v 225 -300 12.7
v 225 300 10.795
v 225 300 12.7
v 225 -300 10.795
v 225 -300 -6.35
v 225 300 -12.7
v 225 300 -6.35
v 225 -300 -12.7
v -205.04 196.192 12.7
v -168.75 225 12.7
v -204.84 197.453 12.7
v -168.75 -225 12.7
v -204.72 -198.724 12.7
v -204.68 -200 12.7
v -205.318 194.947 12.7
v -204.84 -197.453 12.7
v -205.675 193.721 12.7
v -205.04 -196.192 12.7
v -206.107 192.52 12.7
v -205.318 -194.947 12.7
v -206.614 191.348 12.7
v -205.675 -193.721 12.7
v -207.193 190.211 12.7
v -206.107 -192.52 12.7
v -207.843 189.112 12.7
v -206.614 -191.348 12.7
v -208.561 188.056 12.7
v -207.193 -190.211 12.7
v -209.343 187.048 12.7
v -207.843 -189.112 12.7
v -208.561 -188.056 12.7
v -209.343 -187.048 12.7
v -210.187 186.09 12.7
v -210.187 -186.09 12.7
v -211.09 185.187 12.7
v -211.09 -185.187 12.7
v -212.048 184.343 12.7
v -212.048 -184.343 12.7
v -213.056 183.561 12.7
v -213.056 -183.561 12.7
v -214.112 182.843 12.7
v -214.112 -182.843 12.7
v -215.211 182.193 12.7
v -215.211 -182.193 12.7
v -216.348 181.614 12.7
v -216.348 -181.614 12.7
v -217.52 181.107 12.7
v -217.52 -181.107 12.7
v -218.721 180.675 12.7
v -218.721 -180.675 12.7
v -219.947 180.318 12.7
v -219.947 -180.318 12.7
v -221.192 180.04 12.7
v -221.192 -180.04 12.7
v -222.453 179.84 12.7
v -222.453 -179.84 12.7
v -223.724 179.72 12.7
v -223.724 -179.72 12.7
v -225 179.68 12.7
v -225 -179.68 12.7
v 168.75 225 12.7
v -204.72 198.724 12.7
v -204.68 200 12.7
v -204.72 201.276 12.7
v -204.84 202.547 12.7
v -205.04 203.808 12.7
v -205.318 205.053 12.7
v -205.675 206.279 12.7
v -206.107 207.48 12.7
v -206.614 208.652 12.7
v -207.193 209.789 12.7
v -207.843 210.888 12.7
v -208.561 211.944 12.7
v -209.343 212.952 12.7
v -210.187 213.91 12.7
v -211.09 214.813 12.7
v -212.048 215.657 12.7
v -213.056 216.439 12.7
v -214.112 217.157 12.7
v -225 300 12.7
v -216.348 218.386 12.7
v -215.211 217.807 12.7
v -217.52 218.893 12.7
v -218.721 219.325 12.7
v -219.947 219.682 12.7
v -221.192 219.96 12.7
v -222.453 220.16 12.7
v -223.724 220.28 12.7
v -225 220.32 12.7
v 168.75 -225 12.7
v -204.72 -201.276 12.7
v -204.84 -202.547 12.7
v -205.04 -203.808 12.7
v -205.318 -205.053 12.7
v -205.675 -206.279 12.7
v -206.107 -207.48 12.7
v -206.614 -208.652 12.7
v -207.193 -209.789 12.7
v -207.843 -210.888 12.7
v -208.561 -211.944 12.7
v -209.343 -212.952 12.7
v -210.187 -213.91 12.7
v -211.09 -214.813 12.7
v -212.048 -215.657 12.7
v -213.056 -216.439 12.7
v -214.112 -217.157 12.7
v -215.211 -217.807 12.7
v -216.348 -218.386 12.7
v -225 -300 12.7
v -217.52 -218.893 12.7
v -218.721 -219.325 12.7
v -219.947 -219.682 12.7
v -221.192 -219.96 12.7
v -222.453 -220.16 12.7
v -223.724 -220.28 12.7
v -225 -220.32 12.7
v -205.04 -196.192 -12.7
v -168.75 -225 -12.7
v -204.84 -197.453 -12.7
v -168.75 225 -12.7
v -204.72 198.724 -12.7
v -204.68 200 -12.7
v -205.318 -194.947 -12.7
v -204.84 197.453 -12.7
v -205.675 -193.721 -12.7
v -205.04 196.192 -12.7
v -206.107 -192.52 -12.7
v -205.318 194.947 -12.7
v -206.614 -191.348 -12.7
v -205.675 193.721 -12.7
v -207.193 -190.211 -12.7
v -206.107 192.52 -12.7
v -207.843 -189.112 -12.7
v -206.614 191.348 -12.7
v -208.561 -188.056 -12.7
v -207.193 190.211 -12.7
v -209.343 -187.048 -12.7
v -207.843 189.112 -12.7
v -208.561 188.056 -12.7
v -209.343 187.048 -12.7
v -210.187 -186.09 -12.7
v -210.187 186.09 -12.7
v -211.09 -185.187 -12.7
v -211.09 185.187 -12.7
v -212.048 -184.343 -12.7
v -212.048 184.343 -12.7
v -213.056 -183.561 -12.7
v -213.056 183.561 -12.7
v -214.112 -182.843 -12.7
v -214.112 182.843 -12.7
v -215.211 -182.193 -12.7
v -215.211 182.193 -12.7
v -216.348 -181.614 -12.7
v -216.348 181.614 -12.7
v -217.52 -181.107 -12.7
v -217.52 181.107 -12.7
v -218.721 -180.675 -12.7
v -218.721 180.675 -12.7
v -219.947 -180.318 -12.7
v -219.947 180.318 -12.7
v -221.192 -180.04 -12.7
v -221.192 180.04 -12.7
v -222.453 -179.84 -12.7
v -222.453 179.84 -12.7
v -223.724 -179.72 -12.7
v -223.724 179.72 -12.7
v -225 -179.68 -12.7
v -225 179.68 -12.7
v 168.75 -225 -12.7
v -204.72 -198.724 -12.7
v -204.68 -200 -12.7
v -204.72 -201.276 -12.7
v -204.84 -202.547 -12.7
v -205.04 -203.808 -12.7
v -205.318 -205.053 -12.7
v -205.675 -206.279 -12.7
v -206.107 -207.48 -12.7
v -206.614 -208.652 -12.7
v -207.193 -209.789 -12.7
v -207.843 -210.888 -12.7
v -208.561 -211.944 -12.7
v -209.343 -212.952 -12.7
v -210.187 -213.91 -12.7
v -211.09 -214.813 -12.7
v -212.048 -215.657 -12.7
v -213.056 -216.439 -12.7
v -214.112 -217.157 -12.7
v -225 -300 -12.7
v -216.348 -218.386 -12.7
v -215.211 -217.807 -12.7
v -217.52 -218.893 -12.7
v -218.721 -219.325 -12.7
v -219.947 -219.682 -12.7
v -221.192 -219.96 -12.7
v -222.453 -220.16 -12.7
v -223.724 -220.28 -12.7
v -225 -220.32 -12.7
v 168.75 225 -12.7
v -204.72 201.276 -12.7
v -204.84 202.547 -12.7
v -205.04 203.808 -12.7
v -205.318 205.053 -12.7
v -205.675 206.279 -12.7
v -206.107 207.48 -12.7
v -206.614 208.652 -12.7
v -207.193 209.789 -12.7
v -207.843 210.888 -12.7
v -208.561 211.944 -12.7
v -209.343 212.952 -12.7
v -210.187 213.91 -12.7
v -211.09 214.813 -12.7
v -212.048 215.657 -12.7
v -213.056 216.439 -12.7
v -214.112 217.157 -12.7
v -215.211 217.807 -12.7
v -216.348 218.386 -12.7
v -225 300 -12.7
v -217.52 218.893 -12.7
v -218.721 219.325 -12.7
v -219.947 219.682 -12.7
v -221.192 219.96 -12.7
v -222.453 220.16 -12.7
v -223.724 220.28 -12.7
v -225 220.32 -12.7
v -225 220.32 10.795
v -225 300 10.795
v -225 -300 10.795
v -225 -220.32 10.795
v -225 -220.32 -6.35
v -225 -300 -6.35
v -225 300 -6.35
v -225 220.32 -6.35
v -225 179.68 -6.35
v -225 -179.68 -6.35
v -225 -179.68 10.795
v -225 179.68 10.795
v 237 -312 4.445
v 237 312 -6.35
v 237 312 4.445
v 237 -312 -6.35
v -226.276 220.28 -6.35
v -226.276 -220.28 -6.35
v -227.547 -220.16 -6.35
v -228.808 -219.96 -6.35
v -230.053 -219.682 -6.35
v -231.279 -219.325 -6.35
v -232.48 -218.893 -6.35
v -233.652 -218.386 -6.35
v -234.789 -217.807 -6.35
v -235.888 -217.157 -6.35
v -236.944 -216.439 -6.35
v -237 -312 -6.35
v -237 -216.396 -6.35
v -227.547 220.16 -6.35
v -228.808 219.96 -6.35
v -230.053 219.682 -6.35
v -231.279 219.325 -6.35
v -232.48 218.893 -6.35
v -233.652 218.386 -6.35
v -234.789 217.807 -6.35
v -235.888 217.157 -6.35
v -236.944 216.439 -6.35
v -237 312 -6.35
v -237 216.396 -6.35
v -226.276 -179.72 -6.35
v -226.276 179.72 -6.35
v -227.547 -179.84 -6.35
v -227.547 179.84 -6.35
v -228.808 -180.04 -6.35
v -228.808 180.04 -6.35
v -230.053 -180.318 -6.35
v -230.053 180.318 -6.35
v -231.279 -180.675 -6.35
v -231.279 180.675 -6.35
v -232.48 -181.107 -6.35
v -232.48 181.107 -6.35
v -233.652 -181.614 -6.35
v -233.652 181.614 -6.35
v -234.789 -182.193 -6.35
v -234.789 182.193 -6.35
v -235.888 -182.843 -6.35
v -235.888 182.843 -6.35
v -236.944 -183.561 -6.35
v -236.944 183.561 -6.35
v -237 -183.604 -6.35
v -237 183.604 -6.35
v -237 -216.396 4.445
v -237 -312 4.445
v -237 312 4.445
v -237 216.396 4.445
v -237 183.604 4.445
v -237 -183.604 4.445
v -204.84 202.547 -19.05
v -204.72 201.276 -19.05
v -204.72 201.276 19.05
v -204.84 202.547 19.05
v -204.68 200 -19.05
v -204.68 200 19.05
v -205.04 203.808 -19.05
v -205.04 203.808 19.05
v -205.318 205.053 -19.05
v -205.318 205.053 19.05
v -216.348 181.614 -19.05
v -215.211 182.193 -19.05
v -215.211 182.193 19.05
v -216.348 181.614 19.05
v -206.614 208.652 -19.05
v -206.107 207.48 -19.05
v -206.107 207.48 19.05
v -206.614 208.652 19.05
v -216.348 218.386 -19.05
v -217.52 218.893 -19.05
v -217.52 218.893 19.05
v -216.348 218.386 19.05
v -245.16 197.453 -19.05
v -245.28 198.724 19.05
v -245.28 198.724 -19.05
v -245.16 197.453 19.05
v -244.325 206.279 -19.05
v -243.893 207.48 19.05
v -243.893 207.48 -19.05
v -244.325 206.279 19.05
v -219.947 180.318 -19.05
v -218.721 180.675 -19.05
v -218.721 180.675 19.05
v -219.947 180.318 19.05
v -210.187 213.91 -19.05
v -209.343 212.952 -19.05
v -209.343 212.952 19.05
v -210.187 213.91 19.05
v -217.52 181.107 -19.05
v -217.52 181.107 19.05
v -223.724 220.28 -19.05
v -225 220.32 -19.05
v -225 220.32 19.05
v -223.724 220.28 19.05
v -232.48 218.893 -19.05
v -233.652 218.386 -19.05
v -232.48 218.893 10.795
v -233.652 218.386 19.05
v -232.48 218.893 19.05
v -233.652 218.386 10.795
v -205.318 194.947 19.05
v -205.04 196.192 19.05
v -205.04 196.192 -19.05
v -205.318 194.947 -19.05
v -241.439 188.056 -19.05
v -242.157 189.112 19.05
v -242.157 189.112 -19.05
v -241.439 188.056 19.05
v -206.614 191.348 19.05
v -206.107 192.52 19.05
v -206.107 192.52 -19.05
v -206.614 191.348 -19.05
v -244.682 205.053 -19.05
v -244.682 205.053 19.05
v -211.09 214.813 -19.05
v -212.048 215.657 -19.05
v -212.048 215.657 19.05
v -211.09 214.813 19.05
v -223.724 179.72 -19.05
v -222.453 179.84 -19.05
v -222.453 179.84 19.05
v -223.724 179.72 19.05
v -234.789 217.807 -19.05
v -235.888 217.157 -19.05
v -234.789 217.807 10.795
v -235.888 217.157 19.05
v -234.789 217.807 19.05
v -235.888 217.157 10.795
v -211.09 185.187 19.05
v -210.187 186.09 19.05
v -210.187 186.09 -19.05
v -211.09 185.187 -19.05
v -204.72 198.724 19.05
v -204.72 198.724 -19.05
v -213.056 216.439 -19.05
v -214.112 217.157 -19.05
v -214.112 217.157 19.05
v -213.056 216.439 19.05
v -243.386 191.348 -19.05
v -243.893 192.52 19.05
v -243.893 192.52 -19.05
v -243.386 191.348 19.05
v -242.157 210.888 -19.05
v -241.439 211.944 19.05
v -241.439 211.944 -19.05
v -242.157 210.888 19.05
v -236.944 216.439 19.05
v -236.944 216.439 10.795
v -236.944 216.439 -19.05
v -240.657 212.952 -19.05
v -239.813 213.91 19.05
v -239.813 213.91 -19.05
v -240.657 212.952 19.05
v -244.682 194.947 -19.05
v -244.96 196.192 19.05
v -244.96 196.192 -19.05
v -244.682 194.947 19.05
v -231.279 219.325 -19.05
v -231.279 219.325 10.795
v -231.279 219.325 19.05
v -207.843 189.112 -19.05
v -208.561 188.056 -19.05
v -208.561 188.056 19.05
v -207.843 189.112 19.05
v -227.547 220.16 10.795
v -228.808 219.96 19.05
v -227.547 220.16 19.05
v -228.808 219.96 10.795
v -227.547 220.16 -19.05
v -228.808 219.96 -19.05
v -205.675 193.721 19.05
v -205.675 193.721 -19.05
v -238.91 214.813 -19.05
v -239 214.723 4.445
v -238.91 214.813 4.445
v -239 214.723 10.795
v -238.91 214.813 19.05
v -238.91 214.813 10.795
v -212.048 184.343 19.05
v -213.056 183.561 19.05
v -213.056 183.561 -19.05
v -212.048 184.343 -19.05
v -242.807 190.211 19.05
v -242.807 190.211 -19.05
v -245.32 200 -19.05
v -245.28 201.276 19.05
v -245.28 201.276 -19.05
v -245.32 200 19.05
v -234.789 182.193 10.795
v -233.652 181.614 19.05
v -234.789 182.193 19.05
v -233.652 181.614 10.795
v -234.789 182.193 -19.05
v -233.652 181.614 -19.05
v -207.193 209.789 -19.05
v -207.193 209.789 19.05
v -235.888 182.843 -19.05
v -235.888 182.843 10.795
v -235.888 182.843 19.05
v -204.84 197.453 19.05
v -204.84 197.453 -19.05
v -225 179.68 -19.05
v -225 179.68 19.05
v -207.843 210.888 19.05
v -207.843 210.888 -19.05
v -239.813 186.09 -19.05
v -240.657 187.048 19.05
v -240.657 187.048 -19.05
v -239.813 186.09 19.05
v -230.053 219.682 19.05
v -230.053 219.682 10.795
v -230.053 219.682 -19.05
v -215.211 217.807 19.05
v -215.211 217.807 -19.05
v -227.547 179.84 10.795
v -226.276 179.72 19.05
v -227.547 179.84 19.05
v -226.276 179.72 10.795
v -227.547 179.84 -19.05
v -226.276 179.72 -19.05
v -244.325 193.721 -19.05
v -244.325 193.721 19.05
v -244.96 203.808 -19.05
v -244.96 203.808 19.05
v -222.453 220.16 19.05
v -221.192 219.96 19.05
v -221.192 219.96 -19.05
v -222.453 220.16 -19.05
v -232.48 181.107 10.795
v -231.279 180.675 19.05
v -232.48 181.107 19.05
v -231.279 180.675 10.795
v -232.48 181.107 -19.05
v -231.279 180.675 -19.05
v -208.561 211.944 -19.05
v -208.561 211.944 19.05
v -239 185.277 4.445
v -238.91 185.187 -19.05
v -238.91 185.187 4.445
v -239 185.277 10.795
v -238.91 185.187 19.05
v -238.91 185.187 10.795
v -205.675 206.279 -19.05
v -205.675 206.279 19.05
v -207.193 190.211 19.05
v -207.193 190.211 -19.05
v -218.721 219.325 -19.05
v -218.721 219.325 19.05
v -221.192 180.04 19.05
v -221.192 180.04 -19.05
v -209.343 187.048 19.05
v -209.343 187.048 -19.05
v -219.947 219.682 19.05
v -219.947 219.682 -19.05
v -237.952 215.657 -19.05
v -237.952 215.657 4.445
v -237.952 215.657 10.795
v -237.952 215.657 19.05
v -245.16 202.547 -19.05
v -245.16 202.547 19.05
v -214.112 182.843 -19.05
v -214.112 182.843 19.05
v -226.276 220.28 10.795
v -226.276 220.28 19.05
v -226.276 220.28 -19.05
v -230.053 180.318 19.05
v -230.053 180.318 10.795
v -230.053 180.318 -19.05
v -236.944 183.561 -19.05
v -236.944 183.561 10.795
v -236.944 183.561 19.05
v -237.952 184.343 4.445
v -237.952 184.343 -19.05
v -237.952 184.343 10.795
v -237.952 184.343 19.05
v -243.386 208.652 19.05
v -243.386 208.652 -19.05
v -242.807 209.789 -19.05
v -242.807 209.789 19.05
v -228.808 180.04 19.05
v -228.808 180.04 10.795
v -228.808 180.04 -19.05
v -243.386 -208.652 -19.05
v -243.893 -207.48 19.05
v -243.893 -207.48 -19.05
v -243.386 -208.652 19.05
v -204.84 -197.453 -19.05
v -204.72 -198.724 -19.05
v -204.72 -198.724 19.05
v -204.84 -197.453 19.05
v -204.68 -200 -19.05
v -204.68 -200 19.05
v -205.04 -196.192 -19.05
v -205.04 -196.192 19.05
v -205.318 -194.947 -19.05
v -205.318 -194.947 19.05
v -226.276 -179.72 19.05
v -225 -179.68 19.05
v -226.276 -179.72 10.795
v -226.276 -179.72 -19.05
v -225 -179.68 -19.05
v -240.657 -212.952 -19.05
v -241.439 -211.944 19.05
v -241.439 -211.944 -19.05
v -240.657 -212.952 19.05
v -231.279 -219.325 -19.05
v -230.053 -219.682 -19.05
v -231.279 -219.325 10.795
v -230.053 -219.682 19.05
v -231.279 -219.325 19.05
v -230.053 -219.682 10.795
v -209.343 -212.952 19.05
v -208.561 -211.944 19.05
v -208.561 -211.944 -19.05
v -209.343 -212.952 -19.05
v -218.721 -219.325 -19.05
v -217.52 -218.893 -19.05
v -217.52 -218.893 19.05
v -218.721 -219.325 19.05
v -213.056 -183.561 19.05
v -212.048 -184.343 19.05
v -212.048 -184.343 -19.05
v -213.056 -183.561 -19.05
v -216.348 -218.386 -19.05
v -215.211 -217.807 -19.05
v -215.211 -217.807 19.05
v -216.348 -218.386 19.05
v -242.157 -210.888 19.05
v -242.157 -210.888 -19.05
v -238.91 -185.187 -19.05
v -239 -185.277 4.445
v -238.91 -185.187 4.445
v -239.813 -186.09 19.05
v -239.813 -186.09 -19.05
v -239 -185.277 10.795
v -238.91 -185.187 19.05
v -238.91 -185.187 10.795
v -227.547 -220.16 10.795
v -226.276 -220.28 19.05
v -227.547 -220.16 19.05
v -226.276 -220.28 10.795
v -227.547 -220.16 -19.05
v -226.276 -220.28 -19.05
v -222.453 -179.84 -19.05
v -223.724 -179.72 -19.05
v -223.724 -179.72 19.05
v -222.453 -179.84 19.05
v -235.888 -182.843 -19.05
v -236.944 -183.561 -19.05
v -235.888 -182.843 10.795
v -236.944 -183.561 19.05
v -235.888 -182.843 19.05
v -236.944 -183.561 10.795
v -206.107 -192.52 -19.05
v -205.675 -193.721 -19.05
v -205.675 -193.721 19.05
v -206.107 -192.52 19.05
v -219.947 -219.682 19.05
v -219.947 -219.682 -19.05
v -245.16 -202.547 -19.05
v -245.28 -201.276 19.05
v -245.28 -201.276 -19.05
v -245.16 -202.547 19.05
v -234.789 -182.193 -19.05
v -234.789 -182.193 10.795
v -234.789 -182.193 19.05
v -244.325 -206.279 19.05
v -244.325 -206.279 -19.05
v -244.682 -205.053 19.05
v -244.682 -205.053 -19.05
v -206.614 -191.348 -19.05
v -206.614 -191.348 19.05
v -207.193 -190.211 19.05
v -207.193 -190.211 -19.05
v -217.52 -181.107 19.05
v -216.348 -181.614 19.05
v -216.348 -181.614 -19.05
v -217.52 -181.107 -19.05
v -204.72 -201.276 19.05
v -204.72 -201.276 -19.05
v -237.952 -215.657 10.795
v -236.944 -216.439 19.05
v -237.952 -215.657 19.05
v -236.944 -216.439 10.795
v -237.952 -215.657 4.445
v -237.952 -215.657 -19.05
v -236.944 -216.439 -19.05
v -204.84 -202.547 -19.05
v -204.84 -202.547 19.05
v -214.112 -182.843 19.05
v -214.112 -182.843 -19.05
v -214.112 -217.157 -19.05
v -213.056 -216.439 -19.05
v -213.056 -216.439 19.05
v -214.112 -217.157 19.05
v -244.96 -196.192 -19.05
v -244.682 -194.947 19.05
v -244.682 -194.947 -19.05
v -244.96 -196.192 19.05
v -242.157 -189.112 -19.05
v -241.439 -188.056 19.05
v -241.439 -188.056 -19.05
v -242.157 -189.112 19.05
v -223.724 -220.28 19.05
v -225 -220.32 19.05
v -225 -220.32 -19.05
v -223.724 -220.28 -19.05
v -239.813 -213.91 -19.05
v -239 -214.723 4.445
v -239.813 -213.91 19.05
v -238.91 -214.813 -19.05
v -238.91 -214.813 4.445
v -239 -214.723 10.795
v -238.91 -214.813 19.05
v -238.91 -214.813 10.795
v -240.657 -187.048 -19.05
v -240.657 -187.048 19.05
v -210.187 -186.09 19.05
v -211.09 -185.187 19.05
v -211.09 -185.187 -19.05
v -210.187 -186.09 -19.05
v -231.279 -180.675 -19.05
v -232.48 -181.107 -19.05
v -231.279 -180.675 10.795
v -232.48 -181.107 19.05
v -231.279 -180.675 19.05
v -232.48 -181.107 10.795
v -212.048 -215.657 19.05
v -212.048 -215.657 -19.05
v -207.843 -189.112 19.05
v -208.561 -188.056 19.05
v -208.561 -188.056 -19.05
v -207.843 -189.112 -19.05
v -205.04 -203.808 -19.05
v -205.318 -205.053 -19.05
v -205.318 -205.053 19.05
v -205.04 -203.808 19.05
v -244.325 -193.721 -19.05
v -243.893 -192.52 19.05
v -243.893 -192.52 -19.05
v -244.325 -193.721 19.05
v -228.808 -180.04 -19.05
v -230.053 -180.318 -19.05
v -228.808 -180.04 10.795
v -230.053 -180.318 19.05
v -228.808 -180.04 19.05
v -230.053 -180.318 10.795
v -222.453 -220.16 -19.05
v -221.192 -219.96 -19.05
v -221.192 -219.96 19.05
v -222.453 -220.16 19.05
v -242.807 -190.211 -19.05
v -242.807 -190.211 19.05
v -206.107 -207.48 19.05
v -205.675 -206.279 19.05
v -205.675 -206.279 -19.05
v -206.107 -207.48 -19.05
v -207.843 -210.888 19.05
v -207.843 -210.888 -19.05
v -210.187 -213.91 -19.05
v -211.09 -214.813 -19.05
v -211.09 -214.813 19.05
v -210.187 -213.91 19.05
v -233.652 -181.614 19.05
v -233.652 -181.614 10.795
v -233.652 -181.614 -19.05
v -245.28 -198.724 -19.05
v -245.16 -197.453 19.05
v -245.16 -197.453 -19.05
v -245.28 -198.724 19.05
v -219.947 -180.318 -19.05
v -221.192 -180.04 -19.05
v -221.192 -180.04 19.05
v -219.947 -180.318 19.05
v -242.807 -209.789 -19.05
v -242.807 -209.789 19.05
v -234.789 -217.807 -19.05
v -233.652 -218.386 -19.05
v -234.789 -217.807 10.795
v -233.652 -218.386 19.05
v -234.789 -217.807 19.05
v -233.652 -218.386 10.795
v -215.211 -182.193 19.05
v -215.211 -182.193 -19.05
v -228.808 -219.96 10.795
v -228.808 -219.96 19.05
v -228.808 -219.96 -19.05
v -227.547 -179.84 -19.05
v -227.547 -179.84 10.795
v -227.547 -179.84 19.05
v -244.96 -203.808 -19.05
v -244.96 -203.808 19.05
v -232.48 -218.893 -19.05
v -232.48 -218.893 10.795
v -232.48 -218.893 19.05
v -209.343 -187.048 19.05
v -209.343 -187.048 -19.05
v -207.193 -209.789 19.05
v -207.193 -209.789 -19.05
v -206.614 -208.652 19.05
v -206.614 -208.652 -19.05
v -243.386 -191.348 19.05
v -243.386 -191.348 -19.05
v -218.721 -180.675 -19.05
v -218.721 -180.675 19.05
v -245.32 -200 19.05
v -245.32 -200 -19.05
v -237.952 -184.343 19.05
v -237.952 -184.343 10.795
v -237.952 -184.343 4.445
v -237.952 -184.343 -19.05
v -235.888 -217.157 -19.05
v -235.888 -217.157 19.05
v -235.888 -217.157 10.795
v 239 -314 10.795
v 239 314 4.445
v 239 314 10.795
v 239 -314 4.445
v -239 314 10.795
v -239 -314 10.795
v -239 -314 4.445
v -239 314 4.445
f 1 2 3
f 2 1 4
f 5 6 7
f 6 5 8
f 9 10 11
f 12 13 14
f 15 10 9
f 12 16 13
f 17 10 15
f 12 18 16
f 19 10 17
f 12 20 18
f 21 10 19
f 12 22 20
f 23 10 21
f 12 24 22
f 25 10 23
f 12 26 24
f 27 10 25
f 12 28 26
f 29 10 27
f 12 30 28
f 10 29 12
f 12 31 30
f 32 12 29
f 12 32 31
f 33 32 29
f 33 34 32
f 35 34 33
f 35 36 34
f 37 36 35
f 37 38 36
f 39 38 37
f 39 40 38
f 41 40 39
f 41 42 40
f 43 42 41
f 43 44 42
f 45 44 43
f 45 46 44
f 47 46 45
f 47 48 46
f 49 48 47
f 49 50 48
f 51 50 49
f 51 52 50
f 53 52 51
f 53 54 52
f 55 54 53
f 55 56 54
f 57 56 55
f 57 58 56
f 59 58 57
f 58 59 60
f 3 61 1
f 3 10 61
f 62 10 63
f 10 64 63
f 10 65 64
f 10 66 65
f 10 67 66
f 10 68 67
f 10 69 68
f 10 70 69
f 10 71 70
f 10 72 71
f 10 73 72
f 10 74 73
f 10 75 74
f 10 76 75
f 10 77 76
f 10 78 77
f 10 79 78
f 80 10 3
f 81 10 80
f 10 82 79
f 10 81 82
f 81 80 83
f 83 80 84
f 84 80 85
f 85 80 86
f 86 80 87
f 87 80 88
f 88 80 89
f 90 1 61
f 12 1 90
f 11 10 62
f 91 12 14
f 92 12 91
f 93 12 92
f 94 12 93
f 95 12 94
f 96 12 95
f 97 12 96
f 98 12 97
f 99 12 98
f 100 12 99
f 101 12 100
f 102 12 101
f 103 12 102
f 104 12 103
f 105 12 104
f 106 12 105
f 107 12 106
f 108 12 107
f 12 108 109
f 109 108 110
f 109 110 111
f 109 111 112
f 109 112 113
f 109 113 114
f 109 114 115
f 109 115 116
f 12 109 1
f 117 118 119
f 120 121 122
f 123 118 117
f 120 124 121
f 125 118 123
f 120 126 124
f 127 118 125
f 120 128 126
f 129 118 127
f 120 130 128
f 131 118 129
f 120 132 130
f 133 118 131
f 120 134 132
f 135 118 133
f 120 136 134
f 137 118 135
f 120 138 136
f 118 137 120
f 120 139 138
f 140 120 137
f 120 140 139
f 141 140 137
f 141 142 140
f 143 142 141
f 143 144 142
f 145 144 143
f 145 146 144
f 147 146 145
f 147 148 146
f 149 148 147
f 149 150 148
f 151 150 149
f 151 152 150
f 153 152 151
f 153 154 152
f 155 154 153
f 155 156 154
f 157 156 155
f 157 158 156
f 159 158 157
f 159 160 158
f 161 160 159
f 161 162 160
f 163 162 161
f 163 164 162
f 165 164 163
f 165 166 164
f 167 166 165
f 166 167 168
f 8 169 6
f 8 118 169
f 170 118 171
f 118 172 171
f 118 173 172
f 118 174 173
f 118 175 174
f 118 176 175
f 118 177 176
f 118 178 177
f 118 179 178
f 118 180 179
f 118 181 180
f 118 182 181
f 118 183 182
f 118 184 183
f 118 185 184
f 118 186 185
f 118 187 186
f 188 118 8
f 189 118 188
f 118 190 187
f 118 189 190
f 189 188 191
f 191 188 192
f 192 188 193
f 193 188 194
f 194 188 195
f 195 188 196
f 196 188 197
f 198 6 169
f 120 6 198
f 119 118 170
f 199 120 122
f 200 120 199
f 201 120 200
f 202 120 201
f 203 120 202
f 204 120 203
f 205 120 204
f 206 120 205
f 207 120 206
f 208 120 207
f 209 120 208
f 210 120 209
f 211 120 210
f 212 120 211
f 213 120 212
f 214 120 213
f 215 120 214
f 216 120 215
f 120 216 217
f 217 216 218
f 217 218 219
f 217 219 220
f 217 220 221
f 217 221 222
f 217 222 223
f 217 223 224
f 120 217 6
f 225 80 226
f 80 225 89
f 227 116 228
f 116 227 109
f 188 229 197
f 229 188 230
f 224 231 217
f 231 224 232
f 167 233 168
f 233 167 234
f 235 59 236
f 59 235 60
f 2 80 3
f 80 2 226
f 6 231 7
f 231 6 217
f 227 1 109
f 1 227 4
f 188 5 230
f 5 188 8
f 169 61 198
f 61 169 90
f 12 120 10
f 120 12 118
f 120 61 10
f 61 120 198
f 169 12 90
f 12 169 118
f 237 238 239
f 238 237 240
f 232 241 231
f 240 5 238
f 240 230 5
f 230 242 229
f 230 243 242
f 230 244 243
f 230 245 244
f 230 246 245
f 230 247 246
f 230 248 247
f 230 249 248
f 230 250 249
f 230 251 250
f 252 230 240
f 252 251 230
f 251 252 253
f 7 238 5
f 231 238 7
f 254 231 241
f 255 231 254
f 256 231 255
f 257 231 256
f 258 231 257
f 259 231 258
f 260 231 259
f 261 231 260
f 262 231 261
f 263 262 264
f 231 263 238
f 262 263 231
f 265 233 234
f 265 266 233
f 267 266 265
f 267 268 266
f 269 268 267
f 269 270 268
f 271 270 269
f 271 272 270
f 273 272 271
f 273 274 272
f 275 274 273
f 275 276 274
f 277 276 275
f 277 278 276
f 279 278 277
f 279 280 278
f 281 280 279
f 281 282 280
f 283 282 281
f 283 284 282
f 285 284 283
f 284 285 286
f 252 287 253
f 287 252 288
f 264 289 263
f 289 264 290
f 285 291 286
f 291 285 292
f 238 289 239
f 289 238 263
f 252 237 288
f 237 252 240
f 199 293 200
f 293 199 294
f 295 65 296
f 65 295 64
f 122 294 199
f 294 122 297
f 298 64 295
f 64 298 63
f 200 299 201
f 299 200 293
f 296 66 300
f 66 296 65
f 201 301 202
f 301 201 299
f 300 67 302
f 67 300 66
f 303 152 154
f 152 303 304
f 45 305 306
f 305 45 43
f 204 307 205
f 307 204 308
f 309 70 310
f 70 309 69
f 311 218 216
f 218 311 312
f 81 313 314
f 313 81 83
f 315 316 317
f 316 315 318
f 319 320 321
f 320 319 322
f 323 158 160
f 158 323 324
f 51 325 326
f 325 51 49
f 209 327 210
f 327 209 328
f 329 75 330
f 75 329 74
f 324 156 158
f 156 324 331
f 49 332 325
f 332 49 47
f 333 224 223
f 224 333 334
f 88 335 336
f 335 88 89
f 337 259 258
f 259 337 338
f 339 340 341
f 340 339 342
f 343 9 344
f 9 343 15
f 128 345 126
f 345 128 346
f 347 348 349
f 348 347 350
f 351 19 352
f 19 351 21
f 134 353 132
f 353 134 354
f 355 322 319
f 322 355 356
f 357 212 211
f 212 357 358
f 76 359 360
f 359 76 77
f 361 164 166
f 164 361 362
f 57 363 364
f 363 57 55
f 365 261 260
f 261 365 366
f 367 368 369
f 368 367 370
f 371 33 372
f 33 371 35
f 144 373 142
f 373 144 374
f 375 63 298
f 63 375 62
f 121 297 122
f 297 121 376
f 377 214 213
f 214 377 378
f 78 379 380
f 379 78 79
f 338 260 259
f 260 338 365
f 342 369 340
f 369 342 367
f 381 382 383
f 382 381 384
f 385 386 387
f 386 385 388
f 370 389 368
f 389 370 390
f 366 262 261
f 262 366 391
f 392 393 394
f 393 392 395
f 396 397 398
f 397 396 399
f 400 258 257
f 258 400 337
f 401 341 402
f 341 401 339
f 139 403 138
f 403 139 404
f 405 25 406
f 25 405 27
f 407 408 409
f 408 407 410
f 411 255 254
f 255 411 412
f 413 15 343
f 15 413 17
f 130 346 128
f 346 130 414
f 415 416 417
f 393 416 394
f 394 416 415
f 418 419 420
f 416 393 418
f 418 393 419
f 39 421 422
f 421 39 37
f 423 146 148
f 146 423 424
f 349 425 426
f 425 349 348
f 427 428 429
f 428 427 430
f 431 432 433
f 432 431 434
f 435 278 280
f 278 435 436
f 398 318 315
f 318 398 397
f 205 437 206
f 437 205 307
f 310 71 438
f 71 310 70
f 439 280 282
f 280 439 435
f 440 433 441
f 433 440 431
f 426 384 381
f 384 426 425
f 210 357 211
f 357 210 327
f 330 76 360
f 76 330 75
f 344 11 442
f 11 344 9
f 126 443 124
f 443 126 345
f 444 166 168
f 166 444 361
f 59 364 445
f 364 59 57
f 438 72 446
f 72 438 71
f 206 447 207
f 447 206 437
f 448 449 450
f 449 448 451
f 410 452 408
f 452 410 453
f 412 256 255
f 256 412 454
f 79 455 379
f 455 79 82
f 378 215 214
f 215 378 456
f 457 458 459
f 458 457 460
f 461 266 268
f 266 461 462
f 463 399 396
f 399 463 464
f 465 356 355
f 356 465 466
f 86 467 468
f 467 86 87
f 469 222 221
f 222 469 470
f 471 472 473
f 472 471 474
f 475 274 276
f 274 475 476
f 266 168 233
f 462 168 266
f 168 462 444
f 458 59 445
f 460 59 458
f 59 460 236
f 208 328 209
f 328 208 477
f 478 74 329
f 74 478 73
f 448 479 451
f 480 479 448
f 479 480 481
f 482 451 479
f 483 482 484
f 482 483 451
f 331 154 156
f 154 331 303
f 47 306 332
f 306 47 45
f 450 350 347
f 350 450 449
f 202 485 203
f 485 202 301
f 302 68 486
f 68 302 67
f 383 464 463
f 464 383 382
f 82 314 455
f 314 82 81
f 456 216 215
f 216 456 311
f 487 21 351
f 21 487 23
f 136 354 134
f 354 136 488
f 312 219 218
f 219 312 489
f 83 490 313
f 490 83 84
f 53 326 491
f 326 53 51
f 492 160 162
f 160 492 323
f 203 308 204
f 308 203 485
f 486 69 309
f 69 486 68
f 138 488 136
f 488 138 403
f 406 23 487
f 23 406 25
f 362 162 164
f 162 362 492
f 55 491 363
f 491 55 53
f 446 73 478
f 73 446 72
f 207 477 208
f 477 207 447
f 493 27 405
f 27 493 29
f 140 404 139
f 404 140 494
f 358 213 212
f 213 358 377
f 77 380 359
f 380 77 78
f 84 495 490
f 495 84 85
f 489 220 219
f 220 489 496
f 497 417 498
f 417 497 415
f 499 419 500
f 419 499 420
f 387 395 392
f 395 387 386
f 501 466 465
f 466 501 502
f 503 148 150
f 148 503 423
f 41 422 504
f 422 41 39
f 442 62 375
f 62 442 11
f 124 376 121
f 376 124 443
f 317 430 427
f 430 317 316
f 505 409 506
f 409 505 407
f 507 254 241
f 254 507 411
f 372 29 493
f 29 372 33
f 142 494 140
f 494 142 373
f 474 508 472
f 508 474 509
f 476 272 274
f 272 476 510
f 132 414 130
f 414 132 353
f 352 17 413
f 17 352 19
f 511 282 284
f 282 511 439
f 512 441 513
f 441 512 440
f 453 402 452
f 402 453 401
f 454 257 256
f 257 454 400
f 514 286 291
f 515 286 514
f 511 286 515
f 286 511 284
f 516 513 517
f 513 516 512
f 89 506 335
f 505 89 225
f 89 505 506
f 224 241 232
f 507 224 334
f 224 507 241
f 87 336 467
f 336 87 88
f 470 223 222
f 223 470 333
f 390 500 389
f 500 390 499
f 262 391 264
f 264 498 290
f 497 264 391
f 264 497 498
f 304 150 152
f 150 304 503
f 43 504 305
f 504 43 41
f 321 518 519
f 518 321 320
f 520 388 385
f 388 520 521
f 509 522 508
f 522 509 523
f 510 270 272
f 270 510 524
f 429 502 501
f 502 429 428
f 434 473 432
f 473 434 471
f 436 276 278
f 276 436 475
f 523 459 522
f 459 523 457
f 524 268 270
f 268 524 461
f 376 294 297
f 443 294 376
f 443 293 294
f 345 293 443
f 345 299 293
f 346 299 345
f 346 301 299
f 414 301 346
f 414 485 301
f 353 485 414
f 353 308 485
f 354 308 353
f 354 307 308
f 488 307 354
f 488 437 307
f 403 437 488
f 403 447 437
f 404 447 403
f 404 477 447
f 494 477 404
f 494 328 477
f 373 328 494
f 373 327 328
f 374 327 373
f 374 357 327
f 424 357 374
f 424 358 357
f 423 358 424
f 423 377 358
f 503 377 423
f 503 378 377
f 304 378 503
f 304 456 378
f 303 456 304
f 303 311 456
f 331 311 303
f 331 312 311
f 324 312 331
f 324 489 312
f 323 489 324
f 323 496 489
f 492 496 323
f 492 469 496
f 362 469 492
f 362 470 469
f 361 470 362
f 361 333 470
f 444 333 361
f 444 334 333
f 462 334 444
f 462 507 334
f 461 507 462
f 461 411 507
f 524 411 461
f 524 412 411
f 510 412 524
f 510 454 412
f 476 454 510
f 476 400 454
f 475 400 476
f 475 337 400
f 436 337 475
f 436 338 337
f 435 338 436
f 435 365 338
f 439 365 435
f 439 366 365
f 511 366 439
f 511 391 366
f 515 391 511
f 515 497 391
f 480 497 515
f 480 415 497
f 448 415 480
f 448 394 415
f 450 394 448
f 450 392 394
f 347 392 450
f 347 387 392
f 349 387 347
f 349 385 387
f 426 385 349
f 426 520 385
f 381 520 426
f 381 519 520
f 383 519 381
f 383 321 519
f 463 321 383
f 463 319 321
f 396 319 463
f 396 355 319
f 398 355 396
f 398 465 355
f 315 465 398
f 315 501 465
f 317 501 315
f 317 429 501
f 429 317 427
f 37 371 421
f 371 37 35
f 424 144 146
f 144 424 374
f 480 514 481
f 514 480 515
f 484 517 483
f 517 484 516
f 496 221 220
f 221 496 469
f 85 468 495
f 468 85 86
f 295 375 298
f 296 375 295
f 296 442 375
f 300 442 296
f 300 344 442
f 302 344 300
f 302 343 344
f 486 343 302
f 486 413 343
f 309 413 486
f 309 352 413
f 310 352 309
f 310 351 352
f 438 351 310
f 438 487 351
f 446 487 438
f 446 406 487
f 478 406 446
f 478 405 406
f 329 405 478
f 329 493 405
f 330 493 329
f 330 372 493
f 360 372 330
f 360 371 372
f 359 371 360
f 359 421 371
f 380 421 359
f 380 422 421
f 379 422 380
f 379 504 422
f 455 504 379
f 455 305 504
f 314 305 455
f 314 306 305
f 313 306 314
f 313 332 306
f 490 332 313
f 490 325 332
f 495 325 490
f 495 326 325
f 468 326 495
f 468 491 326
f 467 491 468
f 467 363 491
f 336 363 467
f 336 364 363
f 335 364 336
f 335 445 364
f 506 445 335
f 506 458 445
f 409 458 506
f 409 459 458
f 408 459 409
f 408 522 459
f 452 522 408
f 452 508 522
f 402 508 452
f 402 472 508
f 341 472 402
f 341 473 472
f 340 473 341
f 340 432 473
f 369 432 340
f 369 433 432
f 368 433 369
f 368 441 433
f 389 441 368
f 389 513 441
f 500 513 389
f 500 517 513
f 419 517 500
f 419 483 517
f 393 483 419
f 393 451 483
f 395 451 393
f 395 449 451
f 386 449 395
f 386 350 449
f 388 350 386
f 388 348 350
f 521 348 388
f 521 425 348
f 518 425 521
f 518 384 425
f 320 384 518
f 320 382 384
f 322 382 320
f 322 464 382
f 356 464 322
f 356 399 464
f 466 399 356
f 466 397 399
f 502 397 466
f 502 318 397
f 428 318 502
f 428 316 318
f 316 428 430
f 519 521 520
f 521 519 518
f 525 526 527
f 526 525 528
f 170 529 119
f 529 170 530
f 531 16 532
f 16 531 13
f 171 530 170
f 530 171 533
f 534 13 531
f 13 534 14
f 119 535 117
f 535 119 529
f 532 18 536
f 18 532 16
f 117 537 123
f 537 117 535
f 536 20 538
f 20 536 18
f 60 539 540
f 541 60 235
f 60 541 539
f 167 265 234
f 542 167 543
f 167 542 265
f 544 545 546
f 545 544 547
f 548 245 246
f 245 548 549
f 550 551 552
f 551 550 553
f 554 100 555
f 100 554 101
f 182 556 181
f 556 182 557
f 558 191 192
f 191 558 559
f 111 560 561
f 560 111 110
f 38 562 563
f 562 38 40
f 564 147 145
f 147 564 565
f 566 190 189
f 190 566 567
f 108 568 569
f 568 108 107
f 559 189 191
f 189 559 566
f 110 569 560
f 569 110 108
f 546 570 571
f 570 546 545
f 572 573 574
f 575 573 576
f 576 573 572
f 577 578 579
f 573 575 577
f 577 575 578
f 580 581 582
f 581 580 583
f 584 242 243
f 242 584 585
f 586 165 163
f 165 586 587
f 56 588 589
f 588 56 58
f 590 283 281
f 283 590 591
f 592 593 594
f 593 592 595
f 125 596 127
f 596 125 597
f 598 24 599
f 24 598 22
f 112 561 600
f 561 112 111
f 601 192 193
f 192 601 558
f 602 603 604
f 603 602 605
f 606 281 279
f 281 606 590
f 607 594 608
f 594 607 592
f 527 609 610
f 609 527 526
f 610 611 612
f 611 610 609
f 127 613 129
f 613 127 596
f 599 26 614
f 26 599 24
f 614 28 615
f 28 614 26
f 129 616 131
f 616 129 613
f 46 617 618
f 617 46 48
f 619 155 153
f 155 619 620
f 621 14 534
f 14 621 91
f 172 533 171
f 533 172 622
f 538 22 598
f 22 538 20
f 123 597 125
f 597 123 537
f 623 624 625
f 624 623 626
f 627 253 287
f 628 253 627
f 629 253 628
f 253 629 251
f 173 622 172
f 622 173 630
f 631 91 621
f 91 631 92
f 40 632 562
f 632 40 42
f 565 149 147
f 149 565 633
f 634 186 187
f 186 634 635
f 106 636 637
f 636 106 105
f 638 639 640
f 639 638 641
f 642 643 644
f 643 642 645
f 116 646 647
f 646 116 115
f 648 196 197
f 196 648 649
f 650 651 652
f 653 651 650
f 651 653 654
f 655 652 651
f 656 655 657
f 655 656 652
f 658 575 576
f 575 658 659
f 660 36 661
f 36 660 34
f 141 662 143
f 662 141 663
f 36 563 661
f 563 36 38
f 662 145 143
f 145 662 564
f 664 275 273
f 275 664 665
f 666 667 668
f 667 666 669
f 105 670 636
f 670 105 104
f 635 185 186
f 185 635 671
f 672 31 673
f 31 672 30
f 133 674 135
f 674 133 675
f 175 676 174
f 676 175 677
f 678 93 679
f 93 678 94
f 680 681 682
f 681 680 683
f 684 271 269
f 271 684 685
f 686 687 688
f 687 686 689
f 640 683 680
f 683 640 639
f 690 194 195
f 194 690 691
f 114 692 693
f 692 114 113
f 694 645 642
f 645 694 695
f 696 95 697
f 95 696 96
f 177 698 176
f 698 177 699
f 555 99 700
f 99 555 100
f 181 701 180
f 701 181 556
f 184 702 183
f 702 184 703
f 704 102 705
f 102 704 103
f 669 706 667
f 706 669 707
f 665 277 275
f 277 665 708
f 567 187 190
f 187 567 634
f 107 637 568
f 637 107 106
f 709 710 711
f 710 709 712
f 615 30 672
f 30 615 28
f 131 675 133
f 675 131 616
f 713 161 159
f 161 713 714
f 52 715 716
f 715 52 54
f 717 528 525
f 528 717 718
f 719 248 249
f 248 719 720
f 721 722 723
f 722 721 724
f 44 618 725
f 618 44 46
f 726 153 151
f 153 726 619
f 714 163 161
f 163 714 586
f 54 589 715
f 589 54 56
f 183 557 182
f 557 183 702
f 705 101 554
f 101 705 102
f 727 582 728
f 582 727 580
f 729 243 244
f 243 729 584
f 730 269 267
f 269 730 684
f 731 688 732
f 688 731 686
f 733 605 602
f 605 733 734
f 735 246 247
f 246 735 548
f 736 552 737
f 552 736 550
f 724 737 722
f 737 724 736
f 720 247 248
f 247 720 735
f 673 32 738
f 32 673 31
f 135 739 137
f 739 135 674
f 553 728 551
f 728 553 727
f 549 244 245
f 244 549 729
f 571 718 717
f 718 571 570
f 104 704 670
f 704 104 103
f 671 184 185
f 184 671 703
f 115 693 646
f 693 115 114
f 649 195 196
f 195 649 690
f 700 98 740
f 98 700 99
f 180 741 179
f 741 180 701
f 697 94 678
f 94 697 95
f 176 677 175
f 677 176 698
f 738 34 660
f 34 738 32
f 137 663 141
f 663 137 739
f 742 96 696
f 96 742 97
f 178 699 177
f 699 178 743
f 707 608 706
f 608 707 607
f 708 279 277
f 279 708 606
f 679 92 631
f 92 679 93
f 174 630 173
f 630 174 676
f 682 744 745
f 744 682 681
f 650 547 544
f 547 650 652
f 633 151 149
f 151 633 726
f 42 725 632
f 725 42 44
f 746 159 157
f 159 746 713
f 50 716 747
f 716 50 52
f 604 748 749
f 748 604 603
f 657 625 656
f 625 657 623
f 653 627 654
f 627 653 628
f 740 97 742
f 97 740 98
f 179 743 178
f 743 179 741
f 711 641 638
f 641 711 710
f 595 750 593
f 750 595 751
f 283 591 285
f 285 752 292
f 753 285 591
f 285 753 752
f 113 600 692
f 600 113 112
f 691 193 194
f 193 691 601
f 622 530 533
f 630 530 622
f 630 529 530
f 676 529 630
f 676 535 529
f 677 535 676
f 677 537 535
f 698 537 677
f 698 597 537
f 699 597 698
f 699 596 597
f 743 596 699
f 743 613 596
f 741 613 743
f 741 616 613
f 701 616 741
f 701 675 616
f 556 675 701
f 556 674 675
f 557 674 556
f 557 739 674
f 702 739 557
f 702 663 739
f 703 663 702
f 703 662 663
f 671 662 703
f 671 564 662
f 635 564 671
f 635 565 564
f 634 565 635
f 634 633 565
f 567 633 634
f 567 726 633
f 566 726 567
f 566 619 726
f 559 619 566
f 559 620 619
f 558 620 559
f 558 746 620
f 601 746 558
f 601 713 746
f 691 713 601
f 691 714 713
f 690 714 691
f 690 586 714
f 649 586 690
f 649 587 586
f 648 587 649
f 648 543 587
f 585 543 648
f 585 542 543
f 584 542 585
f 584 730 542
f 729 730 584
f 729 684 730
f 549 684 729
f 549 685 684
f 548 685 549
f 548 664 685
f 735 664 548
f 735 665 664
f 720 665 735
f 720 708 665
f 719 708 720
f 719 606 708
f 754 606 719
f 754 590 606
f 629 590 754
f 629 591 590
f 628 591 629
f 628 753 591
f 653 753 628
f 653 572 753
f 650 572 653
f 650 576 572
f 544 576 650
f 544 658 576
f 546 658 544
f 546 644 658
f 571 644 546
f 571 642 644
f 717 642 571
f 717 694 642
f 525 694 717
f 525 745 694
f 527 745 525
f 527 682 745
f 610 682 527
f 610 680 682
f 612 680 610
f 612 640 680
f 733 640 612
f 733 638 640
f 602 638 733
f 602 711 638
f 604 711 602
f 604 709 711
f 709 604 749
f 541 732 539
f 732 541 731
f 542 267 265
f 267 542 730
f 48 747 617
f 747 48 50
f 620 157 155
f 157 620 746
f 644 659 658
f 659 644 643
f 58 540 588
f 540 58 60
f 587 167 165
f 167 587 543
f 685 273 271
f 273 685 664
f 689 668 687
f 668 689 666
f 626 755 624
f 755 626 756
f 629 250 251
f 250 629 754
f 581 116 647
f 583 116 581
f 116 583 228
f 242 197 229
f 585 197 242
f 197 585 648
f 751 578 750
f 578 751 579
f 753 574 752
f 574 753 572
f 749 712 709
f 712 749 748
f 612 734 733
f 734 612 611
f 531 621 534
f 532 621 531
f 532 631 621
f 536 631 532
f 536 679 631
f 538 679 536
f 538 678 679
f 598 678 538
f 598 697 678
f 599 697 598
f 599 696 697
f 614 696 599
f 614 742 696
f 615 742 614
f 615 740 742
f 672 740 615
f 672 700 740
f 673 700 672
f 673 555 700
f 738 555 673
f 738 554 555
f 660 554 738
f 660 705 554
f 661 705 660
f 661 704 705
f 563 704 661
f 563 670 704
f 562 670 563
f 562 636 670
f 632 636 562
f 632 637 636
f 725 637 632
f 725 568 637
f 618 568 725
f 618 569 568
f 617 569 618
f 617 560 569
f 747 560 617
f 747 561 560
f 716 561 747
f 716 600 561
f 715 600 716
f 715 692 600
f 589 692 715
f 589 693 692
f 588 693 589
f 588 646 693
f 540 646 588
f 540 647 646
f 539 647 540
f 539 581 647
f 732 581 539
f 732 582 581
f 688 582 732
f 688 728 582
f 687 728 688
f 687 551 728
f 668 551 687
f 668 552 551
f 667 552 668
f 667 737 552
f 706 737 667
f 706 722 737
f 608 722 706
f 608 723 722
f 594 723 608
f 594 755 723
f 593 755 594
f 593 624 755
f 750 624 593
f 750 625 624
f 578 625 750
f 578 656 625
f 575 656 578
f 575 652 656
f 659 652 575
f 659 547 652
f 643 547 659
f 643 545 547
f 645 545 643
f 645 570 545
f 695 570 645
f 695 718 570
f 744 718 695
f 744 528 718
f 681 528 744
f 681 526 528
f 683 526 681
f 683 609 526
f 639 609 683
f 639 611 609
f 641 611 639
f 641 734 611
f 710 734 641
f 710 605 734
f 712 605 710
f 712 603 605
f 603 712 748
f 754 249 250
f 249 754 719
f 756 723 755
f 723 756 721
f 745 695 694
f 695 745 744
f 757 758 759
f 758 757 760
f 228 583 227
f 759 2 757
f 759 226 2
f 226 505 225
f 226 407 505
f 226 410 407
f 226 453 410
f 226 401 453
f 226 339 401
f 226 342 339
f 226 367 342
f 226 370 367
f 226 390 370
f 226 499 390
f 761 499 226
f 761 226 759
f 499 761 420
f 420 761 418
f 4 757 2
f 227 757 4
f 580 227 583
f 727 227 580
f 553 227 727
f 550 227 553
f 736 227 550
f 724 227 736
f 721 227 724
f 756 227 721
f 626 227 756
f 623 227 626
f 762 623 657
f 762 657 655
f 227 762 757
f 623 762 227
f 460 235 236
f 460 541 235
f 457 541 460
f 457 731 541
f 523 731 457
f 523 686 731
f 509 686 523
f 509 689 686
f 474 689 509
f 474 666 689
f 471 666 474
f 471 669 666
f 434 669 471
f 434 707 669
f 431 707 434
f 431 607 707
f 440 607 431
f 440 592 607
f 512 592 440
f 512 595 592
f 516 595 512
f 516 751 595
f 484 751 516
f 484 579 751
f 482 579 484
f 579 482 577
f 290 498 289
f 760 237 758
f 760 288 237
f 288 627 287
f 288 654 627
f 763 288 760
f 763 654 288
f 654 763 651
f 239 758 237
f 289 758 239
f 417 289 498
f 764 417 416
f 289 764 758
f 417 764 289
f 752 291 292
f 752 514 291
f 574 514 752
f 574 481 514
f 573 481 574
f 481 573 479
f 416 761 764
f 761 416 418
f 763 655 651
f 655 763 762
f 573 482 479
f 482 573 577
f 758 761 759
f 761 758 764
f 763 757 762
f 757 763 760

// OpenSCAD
// File Path: src/hardware/parametric_animal_door.scad
// =========================================================================
// UNIVAC IX INDUSTRIAL ACCESS CORES — PARAMETRIC ANIMAL-SAFE SHIELD GATE
// Features Dynamic Sizing Scaling and Integrated Neoprene Anti-Fur/Tail Guards
// Washdown-Proof Profile Configured for Constant High-Pressure Water Spray
// =========================================================================

$fn = 100; // Enforce crisp geometric resolutions

// --- DYNAMIC SCALE FACTOR PRINT SETTINGS ---
// Set scale_tier = 1 for Pig/Sheep flap doors; scale_tier = 2 for Large Timber Barn Doors
scale_tier = 1; 

// Sizing Matrix translation block based on selected installation tier
door_width  = (scale_tier == 1) ? 450.0  : 1800.0; // mm
door_height = (scale_tier == 1) ? 600.0  : 2400.0; // mm
door_thick  = (scale_tier == 1) ? 25.4   : 76.2;   // mm

// --- Safety & Fur Guard Constraints ---
guard_clearance = (scale_tier == 1) ? 12.0 : 35.0; // Anti-pinch gap buffer
gasket_thickness = 4.0; // Heavy gauge flexible neoprene backing sheet

module parametric_gate_leaf_assembly() {
    difference() {
        // 1. MAIN WASHDOWN-PROOF CORE SLAB
        // Milled with sloped water-shed channels to eliminate fluid pooling
        cube([door_width, door_height, door_thick], center = true);
        
        // Internal structural weight-reduction cutouts (Maintain structural rigidity)
        translate([0, 0, 0])
            cube([door_width * 0.75, door_height * 0.75, door_thick + 2], center = true);
    }
    
    // 2. CONCENTRIC ANTI-PINCH BRUSH COLLAR (FUR & TAIL SAFE GUARD SHIELD)
    // Extrudes an outer lip along the mating frames to seat the neoprene sweep
    translate([0, 0, 0])
    color("Black") difference() {
        cube([door_width + (guard_clearance * 2), 
              door_height + (guard_clearance * 2), 
              door_thick * 0.5], center = true);
              
        cube([door_width, door_height, door_thick + 4], center = true);
    }
    
    // 3. REINFORCED HINGE BOSSES FOR DIRECT TIMBER MOUNTING
    translate([-(door_width / 2), (door_height / 3), 0])
        cylinder(h = door_thick * 1.5, r = door_thick * 0.8, center = true);
    translate([-(door_width / 2), -(door_height / 3), 0])
        cylinder(h = door_thick * 1.5, r = door_thick * 0.8, center = true);
}

module integrated_neoprene_sweep_gasket() {
    // Visualizes the flexible neoprene shield wrapping the frame gap
    color("DarkGrey", 0.7) translate([0, 0, 0])
        difference() {
            cube([door_width + (guard_clearance * 2) + gasket_thickness, 
                  door_height + (guard_clearance * 2) + gasket_thickness, 
                  door_thick * 0.25], center = true);
            cube([door_width - 2, door_height - 2, door_thick], center = true);
        }
}

// Render the fully scaled composite assembly
parametric_gate_leaf_assembly();
translate([0,0, (door_thick * 0.3)]) integrated_neoprene_sweep_gasket();
